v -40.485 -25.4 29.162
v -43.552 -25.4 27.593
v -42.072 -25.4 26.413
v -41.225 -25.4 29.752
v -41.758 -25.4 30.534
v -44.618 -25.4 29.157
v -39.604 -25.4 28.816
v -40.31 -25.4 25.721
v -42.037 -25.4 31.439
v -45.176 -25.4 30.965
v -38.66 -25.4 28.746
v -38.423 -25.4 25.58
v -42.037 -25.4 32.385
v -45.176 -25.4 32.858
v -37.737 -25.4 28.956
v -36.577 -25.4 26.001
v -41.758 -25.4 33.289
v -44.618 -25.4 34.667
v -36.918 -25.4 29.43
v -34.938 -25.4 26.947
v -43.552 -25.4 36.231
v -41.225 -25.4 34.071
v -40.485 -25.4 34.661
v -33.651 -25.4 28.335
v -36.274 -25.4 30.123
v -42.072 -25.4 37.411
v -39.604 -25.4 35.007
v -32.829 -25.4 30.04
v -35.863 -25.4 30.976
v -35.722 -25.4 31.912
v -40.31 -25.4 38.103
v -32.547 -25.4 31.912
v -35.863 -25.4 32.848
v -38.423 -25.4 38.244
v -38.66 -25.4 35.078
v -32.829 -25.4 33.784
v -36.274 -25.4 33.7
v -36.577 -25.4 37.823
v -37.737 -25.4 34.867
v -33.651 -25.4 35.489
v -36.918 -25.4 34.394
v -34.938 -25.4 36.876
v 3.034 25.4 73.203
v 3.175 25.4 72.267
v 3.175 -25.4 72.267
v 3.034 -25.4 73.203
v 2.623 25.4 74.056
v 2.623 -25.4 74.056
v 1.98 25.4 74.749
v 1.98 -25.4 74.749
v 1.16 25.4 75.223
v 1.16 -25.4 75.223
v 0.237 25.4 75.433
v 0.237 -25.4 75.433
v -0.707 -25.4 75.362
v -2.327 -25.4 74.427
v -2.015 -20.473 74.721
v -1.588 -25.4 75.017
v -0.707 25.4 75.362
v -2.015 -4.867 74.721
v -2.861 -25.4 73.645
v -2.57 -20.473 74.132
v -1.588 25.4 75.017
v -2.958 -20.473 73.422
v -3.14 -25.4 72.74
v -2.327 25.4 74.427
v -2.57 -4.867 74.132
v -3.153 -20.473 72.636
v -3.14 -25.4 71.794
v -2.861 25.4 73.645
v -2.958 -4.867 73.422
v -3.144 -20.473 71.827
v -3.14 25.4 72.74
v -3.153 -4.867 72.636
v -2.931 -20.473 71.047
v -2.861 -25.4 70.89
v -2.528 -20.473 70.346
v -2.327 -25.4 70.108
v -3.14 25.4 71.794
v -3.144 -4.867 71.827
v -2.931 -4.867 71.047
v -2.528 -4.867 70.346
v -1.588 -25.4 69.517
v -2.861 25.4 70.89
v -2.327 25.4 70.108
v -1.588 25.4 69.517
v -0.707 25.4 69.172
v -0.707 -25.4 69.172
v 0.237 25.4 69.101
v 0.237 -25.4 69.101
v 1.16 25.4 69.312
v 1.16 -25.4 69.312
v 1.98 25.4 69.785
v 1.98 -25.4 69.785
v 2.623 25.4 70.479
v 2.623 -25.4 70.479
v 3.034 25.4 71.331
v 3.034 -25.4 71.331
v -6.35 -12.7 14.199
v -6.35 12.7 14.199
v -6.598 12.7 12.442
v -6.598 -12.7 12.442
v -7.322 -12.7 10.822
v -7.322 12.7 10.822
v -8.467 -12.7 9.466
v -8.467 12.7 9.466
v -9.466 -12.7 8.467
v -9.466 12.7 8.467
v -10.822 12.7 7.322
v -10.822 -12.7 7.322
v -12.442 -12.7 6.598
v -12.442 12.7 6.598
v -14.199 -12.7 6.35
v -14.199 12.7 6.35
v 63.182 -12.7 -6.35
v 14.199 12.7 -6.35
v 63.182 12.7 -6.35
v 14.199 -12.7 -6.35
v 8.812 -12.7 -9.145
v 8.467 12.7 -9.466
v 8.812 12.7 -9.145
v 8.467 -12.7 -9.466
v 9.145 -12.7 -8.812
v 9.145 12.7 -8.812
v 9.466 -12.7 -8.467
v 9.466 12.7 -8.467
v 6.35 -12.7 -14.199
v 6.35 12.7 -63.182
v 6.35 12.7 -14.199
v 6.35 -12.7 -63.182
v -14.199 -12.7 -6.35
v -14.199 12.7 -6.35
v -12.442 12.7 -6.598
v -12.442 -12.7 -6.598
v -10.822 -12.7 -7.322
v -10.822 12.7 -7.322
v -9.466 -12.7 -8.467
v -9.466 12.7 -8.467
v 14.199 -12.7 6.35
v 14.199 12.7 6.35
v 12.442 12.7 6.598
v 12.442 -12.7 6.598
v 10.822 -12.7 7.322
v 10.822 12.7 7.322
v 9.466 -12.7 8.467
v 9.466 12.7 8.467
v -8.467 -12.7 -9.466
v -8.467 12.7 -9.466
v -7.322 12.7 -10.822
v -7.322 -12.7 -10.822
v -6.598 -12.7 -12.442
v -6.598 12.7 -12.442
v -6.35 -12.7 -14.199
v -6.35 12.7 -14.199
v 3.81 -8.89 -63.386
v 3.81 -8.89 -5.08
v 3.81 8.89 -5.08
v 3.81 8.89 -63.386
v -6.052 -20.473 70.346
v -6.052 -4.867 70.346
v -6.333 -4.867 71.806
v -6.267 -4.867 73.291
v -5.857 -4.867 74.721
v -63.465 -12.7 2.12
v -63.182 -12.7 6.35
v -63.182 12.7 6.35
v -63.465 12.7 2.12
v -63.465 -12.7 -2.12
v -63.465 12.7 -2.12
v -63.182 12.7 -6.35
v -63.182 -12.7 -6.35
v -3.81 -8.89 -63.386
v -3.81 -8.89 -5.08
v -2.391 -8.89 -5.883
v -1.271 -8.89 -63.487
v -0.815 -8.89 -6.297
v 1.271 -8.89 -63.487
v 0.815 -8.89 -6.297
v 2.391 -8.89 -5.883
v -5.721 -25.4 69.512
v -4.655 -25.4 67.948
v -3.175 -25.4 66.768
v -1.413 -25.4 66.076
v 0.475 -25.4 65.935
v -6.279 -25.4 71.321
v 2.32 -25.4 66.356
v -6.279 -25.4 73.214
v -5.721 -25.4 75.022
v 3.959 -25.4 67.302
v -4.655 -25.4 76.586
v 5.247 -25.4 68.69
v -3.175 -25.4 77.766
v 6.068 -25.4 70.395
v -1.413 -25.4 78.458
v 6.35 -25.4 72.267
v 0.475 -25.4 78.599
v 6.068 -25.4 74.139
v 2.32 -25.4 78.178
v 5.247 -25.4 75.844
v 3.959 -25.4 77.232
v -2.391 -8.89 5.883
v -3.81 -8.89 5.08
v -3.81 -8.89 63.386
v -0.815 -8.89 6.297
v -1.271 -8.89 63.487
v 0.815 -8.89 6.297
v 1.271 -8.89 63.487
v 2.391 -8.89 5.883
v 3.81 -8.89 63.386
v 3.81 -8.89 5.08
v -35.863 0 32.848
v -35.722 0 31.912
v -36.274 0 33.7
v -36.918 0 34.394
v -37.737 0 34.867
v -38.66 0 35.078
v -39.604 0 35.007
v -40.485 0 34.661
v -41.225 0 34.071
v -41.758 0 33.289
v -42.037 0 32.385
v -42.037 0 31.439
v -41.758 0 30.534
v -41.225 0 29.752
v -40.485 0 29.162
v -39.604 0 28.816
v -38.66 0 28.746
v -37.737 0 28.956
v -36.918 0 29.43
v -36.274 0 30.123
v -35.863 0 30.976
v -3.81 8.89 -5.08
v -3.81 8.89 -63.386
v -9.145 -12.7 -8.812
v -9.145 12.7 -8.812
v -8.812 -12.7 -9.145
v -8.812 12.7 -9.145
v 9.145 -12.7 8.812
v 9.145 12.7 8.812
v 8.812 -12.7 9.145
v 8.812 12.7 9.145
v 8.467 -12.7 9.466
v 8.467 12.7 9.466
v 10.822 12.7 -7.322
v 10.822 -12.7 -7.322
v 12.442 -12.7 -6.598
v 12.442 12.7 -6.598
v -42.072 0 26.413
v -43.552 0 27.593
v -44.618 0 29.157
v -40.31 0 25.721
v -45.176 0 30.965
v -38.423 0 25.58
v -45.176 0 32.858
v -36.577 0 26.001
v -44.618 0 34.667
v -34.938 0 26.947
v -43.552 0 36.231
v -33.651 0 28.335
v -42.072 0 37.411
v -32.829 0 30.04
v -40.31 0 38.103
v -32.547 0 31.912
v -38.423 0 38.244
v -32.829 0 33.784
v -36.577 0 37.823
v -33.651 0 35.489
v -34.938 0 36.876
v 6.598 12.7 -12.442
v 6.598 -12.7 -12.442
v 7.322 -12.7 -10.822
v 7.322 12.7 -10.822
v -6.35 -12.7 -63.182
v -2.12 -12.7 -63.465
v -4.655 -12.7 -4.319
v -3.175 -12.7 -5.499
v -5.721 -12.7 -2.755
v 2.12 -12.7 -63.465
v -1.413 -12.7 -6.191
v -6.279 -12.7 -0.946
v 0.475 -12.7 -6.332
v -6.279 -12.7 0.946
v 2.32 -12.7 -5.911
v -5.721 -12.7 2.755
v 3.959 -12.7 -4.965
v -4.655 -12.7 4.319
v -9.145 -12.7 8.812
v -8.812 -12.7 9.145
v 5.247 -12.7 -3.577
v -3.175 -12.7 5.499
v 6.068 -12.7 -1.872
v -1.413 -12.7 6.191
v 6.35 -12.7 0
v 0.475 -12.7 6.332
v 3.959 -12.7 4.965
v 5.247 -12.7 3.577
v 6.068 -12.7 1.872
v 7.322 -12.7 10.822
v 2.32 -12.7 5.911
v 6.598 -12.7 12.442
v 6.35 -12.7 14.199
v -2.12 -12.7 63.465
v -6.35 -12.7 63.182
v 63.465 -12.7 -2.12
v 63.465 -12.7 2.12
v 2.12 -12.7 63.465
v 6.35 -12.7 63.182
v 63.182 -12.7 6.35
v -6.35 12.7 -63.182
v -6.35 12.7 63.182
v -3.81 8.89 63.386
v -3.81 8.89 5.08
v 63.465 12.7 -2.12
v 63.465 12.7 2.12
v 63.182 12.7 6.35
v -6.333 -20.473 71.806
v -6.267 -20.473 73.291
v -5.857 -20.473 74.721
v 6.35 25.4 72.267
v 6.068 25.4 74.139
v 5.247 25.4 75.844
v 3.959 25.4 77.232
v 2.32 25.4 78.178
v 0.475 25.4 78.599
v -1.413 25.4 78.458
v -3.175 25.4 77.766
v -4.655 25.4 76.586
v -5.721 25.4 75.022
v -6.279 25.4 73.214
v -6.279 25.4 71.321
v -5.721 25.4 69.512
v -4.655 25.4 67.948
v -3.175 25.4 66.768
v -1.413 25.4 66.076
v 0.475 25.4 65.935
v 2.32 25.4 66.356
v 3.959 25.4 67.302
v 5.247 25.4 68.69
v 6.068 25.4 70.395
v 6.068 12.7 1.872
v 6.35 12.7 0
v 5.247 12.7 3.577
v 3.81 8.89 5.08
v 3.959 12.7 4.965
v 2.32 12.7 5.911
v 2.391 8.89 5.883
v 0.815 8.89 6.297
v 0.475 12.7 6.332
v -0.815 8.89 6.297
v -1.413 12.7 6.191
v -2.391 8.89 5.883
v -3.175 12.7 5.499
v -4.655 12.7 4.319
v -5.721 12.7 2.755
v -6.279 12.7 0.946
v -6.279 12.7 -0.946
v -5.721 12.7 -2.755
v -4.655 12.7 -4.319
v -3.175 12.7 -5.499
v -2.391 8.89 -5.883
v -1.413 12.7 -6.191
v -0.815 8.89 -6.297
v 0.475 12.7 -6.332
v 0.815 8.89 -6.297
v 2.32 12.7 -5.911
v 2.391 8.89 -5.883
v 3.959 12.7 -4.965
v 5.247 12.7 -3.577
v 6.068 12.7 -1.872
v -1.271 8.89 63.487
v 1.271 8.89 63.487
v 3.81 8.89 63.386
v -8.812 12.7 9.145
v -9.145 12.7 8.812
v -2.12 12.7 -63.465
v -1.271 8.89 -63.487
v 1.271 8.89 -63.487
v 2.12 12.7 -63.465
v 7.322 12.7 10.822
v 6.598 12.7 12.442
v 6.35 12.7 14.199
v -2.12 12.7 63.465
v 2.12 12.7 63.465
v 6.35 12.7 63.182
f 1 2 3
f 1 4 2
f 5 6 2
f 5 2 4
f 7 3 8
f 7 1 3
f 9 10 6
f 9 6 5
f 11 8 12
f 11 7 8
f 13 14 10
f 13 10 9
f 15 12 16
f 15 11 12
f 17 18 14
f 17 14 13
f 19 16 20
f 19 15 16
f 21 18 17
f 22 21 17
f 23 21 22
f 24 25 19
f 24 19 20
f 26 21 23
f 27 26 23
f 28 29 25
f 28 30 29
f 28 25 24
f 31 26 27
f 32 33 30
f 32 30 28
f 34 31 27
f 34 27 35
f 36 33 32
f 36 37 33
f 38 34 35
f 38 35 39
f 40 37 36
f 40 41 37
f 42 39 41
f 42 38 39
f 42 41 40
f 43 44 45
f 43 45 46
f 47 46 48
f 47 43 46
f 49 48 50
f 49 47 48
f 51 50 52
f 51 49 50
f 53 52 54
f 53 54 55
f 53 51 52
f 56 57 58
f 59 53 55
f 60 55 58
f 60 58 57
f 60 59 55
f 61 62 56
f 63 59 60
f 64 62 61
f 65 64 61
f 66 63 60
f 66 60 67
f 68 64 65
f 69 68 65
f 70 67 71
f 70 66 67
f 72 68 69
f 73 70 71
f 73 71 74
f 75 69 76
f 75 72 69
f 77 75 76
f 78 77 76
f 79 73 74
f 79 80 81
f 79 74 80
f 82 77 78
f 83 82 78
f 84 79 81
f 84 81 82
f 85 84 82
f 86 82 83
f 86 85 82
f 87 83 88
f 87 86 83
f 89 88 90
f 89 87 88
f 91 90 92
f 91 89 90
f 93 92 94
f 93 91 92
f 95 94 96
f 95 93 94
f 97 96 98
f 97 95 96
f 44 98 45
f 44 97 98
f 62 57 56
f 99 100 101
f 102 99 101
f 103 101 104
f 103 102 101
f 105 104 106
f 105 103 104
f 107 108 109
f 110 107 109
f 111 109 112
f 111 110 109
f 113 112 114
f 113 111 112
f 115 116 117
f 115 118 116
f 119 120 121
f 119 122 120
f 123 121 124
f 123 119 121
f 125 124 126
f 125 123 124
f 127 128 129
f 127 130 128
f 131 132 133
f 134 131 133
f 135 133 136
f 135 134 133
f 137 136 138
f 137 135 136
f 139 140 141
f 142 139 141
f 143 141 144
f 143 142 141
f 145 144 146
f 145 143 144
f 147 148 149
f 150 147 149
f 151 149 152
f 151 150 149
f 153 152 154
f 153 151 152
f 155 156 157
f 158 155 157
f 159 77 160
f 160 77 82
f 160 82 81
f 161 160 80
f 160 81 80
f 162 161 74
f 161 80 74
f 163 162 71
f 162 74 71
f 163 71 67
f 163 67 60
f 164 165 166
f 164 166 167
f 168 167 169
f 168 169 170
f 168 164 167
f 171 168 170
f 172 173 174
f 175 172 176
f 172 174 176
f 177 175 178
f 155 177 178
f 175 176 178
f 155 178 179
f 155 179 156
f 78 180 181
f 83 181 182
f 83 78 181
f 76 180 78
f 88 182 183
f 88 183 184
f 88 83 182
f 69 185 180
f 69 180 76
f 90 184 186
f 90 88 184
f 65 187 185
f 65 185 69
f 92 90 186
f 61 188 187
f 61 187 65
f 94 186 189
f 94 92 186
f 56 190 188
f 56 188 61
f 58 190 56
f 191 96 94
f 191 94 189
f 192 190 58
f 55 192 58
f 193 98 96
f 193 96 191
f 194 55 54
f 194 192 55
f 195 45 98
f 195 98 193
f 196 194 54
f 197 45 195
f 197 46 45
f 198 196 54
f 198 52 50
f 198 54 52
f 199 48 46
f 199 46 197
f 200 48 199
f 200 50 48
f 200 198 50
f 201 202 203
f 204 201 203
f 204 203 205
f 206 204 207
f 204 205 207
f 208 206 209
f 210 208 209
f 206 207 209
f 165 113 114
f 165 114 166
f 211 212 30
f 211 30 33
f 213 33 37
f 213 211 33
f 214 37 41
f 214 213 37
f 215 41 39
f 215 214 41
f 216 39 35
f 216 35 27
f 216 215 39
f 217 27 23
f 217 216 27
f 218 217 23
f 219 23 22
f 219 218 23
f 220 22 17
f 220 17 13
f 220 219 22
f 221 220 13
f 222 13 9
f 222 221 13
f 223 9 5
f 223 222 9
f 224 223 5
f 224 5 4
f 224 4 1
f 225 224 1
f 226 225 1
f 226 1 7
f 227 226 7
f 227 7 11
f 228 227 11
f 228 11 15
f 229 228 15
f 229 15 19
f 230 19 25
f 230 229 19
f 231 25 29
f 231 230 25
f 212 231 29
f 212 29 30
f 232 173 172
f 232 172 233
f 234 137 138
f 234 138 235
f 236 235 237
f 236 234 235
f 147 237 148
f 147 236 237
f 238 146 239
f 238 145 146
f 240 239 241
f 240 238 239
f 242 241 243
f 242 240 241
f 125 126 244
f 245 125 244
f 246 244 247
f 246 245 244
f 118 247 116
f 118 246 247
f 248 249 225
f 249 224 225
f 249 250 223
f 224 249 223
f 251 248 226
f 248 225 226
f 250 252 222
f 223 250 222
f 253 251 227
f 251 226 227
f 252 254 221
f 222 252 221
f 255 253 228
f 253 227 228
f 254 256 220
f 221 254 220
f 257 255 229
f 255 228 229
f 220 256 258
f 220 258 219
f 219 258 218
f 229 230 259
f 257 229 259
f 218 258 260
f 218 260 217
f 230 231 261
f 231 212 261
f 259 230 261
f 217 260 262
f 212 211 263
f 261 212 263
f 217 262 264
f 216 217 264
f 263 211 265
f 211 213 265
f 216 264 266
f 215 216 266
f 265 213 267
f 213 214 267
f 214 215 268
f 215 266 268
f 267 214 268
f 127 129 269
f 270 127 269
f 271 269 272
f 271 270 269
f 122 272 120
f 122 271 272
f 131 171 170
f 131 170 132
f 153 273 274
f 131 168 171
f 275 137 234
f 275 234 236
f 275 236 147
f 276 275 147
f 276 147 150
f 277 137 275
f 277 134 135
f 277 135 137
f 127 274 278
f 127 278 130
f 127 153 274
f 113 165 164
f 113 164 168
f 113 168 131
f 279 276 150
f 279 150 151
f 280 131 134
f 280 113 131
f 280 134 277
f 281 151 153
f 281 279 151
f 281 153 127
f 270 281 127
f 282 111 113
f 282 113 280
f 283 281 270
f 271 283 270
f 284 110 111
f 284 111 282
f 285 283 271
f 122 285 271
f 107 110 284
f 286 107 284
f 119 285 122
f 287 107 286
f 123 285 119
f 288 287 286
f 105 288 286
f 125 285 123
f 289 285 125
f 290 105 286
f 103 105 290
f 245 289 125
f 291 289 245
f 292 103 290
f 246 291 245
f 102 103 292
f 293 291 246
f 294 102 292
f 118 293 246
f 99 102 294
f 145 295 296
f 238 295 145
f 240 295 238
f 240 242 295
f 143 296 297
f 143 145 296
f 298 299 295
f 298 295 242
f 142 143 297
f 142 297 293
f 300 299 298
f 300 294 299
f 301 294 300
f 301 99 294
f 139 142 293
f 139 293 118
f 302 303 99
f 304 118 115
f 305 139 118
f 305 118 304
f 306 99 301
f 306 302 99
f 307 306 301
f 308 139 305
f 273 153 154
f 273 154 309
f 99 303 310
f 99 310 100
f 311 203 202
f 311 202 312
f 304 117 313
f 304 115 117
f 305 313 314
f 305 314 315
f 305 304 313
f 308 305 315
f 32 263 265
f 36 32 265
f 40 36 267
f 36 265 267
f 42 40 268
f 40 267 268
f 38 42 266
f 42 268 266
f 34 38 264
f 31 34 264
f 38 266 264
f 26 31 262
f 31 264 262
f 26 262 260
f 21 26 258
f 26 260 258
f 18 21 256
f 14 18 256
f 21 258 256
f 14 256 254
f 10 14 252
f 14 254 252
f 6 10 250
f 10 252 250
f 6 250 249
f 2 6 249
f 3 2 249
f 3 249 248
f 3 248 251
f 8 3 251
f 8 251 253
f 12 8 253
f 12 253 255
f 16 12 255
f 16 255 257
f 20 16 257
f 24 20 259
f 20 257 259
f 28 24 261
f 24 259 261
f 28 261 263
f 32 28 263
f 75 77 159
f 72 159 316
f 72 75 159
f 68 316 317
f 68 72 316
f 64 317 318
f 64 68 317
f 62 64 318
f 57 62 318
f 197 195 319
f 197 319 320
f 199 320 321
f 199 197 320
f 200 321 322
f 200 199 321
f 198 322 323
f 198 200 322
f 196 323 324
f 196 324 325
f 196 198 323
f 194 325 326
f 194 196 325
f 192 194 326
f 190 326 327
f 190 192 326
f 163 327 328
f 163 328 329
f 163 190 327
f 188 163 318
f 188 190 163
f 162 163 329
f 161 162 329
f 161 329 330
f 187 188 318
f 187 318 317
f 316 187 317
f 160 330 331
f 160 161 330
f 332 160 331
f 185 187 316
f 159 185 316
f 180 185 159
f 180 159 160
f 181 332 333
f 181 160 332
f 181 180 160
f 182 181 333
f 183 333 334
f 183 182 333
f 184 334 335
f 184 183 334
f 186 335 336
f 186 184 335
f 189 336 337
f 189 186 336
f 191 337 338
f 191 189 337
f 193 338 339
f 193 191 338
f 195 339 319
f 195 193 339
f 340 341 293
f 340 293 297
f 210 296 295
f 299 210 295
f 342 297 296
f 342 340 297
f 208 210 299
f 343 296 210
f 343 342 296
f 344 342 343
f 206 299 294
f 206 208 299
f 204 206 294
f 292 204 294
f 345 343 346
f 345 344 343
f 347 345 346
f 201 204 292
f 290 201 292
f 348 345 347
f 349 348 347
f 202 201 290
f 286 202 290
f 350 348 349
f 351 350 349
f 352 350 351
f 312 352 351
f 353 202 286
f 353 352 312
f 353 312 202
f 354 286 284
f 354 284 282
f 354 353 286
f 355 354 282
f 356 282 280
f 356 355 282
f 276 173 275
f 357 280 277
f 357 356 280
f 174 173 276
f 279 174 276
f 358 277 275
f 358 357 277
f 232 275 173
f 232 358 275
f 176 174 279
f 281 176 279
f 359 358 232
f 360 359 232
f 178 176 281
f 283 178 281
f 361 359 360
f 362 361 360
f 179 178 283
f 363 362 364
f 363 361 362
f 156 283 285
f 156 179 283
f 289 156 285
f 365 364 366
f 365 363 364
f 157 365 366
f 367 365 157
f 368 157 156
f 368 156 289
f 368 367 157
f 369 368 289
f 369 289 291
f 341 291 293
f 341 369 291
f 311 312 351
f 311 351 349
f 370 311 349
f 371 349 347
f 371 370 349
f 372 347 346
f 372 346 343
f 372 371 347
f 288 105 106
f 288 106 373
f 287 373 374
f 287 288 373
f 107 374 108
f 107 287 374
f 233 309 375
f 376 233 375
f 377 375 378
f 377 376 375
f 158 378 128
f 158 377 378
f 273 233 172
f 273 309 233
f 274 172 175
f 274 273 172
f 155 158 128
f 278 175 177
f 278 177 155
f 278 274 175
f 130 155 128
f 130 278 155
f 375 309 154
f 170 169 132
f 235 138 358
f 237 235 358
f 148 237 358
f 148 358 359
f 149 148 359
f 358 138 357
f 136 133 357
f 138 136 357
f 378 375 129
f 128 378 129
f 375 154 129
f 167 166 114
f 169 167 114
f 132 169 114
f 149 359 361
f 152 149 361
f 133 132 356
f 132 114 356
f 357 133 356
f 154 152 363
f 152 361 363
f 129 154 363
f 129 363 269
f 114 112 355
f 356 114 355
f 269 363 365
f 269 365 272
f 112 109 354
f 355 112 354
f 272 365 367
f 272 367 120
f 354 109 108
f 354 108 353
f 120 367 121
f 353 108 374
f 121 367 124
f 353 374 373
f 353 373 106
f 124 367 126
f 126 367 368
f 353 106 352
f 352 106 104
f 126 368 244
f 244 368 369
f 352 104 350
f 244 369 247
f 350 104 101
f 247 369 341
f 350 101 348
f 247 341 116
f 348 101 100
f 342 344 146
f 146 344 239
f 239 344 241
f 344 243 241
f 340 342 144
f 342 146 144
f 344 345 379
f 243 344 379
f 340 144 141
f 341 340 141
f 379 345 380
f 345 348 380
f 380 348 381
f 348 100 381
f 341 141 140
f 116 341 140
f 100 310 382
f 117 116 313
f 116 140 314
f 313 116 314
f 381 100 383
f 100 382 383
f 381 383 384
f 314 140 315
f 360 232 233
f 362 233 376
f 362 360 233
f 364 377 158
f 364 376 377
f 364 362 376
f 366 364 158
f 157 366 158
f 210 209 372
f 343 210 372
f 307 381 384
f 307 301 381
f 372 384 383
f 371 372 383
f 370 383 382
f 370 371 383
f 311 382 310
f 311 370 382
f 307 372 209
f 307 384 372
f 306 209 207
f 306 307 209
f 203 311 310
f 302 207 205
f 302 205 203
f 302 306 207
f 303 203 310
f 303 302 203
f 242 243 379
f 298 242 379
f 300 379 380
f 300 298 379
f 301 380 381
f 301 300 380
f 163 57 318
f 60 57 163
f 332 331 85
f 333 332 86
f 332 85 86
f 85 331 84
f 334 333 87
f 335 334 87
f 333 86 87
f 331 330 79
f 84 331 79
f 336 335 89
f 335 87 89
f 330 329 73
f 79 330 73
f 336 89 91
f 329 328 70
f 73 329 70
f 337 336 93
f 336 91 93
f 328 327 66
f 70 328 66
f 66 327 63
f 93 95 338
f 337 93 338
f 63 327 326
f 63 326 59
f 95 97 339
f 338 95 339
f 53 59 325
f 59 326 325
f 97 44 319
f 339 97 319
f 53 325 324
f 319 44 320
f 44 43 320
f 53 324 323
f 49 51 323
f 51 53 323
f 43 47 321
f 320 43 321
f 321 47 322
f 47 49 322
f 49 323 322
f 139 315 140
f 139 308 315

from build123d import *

# Parameters (mm, degrees)
F0_R     = 6.35
F1_DEPTH = 12.7
F2_W     = 7.62
F2_H     = 17.78
F3_DEPTH = 63.5
F4_R     = 6.35
F4_R_2   = 3.175
F5_DEPTH = 25.4
F6_W     = 15.6068057844
F6_H     = 4.3750892854
F7_DEPTH = 7.62
F8_R     = 6.35
F8_R_2   = 3.175
F9_DEPTH = 25.4


with BuildPart() as f1:
    # F0 (on Front) → F1 (new body, symmetric)
    with BuildSketch(Plane.XZ):
        with BuildLine():
            Line((6.35, 14.1990316571), (6.35, 63.1817022563))
            ThreePointArc((6.35, 63.1817022563), (0, 63.5), (-6.35, 63.1817022563))
            Line((-6.35, 63.1817022563), (-6.35, 14.1990316571))
            ThreePointArc((-6.35, 14.1990316571), (-6.9032695997, 11.6066550127), (-8.4666666667, 9.4660211047))
            ThreePointArc((-8.4666666667, 9.4660211047), (-8.9802561211, 8.9802561211), (-9.4660211047, 8.4666666667))
            ThreePointArc((-9.4660211047, 8.4666666667), (-11.6066550127, 6.9032695997), (-14.1990316571, 6.35))
            Line((-14.1990316571, 6.35), (-63.1817022563, 6.35))
            ThreePointArc((-63.1817022563, 6.35), (-63.5, 0), (-63.1817022563, -6.35))
            Line((-63.1817022563, -6.35), (-14.1990316571, -6.35))
            ThreePointArc((-14.1990316571, -6.35), (-11.6066550127, -6.9032695997), (-9.4660211047, -8.4666666667))
            ThreePointArc((-9.4660211047, -8.4666666667), (-8.9802561211, -8.9802561211), (-8.4666666667, -9.4660211047))
            ThreePointArc((-8.4666666667, -9.4660211047), (-6.9032695997, -11.6066550127), (-6.35, -14.1990316571))
            Line((-6.35, -14.1990316571), (-6.35, -63.1817022563))
            ThreePointArc((-6.35, -63.1817022563), (0, -63.5), (6.35, -63.1817022563))
            Line((6.35, -63.1817022563), (6.35, -14.1990316571))
            ThreePointArc((6.35, -14.1990316571), (6.9032695997, -11.6066550127), (8.4666666667, -9.4660211047))
            ThreePointArc((8.4666666667, -9.4660211047), (8.9802561211, -8.9802561211), (9.4660211047, -8.4666666667))
            ThreePointArc((9.4660211047, -8.4666666667), (11.6066550127, -6.9032695997), (14.1990316571, -6.35))
            Line((14.1990316571, -6.35), (63.1817022563, -6.35))
            ThreePointArc((63.1817022563, -6.35), (63.5, 0), (63.1817022563, 6.35))
            Line((63.1817022563, 6.35), (14.1990316571, 6.35))
            ThreePointArc((14.1990316571, 6.35), (11.6066550127, 6.9032695997), (9.4660211047, 8.4666666667))
            ThreePointArc((9.4660211047, 8.4666666667), (8.9802561211, 8.9802561211), (8.4666666667, 9.4660211047))
            ThreePointArc((8.4666666667, 9.4660211047), (6.9032695997, 11.6066550127), (6.35, 14.1990316571))
        make_face()
        Circle(F0_R, mode=Mode.SUBTRACT)
    extrude(amount=F1_DEPTH, both=True)

    # F2 (on Top) → F3 (cut, symmetric)
    with BuildSketch(Plane.XY):
        Rectangle(F2_W, F2_H)
    extrude(amount=F3_DEPTH, both=True, mode=Mode.SUBTRACT)


with BuildPart() as f5:
    # F4 (on Front) → F5 (new body, symmetric)
    with BuildSketch(Plane.XZ):
        with Locations((0, 72.2670927644)):
            Circle(F4_R)
        with Locations((0, 72.2670927644)):
            Circle(F4_R_2, mode=Mode.SUBTRACT)
    extrude(amount=F5_DEPTH, both=True)

    # F6 (on Right) → F7 (cut)
    with BuildSketch(Plane.YZ):
        with Locations((-12.669967137, 72.5331013586)):
            Rectangle(F6_W, F6_H)
    extrude(amount=-F7_DEPTH, mode=Mode.SUBTRACT)


with BuildPart() as f9:
    # F8 (on Front) → F9 (new body)
    with BuildSketch(Plane.XZ):
        with Locations((-38.8971231878, 31.911842525)):
            Circle(F8_R)
        with Locations((-38.8971231878, 31.911842525)):
            Circle(F8_R_2, mode=Mode.SUBTRACT)
    extrude(amount=F9_DEPTH)


solid = Compound([f1.part, f5.part, f9.part])
